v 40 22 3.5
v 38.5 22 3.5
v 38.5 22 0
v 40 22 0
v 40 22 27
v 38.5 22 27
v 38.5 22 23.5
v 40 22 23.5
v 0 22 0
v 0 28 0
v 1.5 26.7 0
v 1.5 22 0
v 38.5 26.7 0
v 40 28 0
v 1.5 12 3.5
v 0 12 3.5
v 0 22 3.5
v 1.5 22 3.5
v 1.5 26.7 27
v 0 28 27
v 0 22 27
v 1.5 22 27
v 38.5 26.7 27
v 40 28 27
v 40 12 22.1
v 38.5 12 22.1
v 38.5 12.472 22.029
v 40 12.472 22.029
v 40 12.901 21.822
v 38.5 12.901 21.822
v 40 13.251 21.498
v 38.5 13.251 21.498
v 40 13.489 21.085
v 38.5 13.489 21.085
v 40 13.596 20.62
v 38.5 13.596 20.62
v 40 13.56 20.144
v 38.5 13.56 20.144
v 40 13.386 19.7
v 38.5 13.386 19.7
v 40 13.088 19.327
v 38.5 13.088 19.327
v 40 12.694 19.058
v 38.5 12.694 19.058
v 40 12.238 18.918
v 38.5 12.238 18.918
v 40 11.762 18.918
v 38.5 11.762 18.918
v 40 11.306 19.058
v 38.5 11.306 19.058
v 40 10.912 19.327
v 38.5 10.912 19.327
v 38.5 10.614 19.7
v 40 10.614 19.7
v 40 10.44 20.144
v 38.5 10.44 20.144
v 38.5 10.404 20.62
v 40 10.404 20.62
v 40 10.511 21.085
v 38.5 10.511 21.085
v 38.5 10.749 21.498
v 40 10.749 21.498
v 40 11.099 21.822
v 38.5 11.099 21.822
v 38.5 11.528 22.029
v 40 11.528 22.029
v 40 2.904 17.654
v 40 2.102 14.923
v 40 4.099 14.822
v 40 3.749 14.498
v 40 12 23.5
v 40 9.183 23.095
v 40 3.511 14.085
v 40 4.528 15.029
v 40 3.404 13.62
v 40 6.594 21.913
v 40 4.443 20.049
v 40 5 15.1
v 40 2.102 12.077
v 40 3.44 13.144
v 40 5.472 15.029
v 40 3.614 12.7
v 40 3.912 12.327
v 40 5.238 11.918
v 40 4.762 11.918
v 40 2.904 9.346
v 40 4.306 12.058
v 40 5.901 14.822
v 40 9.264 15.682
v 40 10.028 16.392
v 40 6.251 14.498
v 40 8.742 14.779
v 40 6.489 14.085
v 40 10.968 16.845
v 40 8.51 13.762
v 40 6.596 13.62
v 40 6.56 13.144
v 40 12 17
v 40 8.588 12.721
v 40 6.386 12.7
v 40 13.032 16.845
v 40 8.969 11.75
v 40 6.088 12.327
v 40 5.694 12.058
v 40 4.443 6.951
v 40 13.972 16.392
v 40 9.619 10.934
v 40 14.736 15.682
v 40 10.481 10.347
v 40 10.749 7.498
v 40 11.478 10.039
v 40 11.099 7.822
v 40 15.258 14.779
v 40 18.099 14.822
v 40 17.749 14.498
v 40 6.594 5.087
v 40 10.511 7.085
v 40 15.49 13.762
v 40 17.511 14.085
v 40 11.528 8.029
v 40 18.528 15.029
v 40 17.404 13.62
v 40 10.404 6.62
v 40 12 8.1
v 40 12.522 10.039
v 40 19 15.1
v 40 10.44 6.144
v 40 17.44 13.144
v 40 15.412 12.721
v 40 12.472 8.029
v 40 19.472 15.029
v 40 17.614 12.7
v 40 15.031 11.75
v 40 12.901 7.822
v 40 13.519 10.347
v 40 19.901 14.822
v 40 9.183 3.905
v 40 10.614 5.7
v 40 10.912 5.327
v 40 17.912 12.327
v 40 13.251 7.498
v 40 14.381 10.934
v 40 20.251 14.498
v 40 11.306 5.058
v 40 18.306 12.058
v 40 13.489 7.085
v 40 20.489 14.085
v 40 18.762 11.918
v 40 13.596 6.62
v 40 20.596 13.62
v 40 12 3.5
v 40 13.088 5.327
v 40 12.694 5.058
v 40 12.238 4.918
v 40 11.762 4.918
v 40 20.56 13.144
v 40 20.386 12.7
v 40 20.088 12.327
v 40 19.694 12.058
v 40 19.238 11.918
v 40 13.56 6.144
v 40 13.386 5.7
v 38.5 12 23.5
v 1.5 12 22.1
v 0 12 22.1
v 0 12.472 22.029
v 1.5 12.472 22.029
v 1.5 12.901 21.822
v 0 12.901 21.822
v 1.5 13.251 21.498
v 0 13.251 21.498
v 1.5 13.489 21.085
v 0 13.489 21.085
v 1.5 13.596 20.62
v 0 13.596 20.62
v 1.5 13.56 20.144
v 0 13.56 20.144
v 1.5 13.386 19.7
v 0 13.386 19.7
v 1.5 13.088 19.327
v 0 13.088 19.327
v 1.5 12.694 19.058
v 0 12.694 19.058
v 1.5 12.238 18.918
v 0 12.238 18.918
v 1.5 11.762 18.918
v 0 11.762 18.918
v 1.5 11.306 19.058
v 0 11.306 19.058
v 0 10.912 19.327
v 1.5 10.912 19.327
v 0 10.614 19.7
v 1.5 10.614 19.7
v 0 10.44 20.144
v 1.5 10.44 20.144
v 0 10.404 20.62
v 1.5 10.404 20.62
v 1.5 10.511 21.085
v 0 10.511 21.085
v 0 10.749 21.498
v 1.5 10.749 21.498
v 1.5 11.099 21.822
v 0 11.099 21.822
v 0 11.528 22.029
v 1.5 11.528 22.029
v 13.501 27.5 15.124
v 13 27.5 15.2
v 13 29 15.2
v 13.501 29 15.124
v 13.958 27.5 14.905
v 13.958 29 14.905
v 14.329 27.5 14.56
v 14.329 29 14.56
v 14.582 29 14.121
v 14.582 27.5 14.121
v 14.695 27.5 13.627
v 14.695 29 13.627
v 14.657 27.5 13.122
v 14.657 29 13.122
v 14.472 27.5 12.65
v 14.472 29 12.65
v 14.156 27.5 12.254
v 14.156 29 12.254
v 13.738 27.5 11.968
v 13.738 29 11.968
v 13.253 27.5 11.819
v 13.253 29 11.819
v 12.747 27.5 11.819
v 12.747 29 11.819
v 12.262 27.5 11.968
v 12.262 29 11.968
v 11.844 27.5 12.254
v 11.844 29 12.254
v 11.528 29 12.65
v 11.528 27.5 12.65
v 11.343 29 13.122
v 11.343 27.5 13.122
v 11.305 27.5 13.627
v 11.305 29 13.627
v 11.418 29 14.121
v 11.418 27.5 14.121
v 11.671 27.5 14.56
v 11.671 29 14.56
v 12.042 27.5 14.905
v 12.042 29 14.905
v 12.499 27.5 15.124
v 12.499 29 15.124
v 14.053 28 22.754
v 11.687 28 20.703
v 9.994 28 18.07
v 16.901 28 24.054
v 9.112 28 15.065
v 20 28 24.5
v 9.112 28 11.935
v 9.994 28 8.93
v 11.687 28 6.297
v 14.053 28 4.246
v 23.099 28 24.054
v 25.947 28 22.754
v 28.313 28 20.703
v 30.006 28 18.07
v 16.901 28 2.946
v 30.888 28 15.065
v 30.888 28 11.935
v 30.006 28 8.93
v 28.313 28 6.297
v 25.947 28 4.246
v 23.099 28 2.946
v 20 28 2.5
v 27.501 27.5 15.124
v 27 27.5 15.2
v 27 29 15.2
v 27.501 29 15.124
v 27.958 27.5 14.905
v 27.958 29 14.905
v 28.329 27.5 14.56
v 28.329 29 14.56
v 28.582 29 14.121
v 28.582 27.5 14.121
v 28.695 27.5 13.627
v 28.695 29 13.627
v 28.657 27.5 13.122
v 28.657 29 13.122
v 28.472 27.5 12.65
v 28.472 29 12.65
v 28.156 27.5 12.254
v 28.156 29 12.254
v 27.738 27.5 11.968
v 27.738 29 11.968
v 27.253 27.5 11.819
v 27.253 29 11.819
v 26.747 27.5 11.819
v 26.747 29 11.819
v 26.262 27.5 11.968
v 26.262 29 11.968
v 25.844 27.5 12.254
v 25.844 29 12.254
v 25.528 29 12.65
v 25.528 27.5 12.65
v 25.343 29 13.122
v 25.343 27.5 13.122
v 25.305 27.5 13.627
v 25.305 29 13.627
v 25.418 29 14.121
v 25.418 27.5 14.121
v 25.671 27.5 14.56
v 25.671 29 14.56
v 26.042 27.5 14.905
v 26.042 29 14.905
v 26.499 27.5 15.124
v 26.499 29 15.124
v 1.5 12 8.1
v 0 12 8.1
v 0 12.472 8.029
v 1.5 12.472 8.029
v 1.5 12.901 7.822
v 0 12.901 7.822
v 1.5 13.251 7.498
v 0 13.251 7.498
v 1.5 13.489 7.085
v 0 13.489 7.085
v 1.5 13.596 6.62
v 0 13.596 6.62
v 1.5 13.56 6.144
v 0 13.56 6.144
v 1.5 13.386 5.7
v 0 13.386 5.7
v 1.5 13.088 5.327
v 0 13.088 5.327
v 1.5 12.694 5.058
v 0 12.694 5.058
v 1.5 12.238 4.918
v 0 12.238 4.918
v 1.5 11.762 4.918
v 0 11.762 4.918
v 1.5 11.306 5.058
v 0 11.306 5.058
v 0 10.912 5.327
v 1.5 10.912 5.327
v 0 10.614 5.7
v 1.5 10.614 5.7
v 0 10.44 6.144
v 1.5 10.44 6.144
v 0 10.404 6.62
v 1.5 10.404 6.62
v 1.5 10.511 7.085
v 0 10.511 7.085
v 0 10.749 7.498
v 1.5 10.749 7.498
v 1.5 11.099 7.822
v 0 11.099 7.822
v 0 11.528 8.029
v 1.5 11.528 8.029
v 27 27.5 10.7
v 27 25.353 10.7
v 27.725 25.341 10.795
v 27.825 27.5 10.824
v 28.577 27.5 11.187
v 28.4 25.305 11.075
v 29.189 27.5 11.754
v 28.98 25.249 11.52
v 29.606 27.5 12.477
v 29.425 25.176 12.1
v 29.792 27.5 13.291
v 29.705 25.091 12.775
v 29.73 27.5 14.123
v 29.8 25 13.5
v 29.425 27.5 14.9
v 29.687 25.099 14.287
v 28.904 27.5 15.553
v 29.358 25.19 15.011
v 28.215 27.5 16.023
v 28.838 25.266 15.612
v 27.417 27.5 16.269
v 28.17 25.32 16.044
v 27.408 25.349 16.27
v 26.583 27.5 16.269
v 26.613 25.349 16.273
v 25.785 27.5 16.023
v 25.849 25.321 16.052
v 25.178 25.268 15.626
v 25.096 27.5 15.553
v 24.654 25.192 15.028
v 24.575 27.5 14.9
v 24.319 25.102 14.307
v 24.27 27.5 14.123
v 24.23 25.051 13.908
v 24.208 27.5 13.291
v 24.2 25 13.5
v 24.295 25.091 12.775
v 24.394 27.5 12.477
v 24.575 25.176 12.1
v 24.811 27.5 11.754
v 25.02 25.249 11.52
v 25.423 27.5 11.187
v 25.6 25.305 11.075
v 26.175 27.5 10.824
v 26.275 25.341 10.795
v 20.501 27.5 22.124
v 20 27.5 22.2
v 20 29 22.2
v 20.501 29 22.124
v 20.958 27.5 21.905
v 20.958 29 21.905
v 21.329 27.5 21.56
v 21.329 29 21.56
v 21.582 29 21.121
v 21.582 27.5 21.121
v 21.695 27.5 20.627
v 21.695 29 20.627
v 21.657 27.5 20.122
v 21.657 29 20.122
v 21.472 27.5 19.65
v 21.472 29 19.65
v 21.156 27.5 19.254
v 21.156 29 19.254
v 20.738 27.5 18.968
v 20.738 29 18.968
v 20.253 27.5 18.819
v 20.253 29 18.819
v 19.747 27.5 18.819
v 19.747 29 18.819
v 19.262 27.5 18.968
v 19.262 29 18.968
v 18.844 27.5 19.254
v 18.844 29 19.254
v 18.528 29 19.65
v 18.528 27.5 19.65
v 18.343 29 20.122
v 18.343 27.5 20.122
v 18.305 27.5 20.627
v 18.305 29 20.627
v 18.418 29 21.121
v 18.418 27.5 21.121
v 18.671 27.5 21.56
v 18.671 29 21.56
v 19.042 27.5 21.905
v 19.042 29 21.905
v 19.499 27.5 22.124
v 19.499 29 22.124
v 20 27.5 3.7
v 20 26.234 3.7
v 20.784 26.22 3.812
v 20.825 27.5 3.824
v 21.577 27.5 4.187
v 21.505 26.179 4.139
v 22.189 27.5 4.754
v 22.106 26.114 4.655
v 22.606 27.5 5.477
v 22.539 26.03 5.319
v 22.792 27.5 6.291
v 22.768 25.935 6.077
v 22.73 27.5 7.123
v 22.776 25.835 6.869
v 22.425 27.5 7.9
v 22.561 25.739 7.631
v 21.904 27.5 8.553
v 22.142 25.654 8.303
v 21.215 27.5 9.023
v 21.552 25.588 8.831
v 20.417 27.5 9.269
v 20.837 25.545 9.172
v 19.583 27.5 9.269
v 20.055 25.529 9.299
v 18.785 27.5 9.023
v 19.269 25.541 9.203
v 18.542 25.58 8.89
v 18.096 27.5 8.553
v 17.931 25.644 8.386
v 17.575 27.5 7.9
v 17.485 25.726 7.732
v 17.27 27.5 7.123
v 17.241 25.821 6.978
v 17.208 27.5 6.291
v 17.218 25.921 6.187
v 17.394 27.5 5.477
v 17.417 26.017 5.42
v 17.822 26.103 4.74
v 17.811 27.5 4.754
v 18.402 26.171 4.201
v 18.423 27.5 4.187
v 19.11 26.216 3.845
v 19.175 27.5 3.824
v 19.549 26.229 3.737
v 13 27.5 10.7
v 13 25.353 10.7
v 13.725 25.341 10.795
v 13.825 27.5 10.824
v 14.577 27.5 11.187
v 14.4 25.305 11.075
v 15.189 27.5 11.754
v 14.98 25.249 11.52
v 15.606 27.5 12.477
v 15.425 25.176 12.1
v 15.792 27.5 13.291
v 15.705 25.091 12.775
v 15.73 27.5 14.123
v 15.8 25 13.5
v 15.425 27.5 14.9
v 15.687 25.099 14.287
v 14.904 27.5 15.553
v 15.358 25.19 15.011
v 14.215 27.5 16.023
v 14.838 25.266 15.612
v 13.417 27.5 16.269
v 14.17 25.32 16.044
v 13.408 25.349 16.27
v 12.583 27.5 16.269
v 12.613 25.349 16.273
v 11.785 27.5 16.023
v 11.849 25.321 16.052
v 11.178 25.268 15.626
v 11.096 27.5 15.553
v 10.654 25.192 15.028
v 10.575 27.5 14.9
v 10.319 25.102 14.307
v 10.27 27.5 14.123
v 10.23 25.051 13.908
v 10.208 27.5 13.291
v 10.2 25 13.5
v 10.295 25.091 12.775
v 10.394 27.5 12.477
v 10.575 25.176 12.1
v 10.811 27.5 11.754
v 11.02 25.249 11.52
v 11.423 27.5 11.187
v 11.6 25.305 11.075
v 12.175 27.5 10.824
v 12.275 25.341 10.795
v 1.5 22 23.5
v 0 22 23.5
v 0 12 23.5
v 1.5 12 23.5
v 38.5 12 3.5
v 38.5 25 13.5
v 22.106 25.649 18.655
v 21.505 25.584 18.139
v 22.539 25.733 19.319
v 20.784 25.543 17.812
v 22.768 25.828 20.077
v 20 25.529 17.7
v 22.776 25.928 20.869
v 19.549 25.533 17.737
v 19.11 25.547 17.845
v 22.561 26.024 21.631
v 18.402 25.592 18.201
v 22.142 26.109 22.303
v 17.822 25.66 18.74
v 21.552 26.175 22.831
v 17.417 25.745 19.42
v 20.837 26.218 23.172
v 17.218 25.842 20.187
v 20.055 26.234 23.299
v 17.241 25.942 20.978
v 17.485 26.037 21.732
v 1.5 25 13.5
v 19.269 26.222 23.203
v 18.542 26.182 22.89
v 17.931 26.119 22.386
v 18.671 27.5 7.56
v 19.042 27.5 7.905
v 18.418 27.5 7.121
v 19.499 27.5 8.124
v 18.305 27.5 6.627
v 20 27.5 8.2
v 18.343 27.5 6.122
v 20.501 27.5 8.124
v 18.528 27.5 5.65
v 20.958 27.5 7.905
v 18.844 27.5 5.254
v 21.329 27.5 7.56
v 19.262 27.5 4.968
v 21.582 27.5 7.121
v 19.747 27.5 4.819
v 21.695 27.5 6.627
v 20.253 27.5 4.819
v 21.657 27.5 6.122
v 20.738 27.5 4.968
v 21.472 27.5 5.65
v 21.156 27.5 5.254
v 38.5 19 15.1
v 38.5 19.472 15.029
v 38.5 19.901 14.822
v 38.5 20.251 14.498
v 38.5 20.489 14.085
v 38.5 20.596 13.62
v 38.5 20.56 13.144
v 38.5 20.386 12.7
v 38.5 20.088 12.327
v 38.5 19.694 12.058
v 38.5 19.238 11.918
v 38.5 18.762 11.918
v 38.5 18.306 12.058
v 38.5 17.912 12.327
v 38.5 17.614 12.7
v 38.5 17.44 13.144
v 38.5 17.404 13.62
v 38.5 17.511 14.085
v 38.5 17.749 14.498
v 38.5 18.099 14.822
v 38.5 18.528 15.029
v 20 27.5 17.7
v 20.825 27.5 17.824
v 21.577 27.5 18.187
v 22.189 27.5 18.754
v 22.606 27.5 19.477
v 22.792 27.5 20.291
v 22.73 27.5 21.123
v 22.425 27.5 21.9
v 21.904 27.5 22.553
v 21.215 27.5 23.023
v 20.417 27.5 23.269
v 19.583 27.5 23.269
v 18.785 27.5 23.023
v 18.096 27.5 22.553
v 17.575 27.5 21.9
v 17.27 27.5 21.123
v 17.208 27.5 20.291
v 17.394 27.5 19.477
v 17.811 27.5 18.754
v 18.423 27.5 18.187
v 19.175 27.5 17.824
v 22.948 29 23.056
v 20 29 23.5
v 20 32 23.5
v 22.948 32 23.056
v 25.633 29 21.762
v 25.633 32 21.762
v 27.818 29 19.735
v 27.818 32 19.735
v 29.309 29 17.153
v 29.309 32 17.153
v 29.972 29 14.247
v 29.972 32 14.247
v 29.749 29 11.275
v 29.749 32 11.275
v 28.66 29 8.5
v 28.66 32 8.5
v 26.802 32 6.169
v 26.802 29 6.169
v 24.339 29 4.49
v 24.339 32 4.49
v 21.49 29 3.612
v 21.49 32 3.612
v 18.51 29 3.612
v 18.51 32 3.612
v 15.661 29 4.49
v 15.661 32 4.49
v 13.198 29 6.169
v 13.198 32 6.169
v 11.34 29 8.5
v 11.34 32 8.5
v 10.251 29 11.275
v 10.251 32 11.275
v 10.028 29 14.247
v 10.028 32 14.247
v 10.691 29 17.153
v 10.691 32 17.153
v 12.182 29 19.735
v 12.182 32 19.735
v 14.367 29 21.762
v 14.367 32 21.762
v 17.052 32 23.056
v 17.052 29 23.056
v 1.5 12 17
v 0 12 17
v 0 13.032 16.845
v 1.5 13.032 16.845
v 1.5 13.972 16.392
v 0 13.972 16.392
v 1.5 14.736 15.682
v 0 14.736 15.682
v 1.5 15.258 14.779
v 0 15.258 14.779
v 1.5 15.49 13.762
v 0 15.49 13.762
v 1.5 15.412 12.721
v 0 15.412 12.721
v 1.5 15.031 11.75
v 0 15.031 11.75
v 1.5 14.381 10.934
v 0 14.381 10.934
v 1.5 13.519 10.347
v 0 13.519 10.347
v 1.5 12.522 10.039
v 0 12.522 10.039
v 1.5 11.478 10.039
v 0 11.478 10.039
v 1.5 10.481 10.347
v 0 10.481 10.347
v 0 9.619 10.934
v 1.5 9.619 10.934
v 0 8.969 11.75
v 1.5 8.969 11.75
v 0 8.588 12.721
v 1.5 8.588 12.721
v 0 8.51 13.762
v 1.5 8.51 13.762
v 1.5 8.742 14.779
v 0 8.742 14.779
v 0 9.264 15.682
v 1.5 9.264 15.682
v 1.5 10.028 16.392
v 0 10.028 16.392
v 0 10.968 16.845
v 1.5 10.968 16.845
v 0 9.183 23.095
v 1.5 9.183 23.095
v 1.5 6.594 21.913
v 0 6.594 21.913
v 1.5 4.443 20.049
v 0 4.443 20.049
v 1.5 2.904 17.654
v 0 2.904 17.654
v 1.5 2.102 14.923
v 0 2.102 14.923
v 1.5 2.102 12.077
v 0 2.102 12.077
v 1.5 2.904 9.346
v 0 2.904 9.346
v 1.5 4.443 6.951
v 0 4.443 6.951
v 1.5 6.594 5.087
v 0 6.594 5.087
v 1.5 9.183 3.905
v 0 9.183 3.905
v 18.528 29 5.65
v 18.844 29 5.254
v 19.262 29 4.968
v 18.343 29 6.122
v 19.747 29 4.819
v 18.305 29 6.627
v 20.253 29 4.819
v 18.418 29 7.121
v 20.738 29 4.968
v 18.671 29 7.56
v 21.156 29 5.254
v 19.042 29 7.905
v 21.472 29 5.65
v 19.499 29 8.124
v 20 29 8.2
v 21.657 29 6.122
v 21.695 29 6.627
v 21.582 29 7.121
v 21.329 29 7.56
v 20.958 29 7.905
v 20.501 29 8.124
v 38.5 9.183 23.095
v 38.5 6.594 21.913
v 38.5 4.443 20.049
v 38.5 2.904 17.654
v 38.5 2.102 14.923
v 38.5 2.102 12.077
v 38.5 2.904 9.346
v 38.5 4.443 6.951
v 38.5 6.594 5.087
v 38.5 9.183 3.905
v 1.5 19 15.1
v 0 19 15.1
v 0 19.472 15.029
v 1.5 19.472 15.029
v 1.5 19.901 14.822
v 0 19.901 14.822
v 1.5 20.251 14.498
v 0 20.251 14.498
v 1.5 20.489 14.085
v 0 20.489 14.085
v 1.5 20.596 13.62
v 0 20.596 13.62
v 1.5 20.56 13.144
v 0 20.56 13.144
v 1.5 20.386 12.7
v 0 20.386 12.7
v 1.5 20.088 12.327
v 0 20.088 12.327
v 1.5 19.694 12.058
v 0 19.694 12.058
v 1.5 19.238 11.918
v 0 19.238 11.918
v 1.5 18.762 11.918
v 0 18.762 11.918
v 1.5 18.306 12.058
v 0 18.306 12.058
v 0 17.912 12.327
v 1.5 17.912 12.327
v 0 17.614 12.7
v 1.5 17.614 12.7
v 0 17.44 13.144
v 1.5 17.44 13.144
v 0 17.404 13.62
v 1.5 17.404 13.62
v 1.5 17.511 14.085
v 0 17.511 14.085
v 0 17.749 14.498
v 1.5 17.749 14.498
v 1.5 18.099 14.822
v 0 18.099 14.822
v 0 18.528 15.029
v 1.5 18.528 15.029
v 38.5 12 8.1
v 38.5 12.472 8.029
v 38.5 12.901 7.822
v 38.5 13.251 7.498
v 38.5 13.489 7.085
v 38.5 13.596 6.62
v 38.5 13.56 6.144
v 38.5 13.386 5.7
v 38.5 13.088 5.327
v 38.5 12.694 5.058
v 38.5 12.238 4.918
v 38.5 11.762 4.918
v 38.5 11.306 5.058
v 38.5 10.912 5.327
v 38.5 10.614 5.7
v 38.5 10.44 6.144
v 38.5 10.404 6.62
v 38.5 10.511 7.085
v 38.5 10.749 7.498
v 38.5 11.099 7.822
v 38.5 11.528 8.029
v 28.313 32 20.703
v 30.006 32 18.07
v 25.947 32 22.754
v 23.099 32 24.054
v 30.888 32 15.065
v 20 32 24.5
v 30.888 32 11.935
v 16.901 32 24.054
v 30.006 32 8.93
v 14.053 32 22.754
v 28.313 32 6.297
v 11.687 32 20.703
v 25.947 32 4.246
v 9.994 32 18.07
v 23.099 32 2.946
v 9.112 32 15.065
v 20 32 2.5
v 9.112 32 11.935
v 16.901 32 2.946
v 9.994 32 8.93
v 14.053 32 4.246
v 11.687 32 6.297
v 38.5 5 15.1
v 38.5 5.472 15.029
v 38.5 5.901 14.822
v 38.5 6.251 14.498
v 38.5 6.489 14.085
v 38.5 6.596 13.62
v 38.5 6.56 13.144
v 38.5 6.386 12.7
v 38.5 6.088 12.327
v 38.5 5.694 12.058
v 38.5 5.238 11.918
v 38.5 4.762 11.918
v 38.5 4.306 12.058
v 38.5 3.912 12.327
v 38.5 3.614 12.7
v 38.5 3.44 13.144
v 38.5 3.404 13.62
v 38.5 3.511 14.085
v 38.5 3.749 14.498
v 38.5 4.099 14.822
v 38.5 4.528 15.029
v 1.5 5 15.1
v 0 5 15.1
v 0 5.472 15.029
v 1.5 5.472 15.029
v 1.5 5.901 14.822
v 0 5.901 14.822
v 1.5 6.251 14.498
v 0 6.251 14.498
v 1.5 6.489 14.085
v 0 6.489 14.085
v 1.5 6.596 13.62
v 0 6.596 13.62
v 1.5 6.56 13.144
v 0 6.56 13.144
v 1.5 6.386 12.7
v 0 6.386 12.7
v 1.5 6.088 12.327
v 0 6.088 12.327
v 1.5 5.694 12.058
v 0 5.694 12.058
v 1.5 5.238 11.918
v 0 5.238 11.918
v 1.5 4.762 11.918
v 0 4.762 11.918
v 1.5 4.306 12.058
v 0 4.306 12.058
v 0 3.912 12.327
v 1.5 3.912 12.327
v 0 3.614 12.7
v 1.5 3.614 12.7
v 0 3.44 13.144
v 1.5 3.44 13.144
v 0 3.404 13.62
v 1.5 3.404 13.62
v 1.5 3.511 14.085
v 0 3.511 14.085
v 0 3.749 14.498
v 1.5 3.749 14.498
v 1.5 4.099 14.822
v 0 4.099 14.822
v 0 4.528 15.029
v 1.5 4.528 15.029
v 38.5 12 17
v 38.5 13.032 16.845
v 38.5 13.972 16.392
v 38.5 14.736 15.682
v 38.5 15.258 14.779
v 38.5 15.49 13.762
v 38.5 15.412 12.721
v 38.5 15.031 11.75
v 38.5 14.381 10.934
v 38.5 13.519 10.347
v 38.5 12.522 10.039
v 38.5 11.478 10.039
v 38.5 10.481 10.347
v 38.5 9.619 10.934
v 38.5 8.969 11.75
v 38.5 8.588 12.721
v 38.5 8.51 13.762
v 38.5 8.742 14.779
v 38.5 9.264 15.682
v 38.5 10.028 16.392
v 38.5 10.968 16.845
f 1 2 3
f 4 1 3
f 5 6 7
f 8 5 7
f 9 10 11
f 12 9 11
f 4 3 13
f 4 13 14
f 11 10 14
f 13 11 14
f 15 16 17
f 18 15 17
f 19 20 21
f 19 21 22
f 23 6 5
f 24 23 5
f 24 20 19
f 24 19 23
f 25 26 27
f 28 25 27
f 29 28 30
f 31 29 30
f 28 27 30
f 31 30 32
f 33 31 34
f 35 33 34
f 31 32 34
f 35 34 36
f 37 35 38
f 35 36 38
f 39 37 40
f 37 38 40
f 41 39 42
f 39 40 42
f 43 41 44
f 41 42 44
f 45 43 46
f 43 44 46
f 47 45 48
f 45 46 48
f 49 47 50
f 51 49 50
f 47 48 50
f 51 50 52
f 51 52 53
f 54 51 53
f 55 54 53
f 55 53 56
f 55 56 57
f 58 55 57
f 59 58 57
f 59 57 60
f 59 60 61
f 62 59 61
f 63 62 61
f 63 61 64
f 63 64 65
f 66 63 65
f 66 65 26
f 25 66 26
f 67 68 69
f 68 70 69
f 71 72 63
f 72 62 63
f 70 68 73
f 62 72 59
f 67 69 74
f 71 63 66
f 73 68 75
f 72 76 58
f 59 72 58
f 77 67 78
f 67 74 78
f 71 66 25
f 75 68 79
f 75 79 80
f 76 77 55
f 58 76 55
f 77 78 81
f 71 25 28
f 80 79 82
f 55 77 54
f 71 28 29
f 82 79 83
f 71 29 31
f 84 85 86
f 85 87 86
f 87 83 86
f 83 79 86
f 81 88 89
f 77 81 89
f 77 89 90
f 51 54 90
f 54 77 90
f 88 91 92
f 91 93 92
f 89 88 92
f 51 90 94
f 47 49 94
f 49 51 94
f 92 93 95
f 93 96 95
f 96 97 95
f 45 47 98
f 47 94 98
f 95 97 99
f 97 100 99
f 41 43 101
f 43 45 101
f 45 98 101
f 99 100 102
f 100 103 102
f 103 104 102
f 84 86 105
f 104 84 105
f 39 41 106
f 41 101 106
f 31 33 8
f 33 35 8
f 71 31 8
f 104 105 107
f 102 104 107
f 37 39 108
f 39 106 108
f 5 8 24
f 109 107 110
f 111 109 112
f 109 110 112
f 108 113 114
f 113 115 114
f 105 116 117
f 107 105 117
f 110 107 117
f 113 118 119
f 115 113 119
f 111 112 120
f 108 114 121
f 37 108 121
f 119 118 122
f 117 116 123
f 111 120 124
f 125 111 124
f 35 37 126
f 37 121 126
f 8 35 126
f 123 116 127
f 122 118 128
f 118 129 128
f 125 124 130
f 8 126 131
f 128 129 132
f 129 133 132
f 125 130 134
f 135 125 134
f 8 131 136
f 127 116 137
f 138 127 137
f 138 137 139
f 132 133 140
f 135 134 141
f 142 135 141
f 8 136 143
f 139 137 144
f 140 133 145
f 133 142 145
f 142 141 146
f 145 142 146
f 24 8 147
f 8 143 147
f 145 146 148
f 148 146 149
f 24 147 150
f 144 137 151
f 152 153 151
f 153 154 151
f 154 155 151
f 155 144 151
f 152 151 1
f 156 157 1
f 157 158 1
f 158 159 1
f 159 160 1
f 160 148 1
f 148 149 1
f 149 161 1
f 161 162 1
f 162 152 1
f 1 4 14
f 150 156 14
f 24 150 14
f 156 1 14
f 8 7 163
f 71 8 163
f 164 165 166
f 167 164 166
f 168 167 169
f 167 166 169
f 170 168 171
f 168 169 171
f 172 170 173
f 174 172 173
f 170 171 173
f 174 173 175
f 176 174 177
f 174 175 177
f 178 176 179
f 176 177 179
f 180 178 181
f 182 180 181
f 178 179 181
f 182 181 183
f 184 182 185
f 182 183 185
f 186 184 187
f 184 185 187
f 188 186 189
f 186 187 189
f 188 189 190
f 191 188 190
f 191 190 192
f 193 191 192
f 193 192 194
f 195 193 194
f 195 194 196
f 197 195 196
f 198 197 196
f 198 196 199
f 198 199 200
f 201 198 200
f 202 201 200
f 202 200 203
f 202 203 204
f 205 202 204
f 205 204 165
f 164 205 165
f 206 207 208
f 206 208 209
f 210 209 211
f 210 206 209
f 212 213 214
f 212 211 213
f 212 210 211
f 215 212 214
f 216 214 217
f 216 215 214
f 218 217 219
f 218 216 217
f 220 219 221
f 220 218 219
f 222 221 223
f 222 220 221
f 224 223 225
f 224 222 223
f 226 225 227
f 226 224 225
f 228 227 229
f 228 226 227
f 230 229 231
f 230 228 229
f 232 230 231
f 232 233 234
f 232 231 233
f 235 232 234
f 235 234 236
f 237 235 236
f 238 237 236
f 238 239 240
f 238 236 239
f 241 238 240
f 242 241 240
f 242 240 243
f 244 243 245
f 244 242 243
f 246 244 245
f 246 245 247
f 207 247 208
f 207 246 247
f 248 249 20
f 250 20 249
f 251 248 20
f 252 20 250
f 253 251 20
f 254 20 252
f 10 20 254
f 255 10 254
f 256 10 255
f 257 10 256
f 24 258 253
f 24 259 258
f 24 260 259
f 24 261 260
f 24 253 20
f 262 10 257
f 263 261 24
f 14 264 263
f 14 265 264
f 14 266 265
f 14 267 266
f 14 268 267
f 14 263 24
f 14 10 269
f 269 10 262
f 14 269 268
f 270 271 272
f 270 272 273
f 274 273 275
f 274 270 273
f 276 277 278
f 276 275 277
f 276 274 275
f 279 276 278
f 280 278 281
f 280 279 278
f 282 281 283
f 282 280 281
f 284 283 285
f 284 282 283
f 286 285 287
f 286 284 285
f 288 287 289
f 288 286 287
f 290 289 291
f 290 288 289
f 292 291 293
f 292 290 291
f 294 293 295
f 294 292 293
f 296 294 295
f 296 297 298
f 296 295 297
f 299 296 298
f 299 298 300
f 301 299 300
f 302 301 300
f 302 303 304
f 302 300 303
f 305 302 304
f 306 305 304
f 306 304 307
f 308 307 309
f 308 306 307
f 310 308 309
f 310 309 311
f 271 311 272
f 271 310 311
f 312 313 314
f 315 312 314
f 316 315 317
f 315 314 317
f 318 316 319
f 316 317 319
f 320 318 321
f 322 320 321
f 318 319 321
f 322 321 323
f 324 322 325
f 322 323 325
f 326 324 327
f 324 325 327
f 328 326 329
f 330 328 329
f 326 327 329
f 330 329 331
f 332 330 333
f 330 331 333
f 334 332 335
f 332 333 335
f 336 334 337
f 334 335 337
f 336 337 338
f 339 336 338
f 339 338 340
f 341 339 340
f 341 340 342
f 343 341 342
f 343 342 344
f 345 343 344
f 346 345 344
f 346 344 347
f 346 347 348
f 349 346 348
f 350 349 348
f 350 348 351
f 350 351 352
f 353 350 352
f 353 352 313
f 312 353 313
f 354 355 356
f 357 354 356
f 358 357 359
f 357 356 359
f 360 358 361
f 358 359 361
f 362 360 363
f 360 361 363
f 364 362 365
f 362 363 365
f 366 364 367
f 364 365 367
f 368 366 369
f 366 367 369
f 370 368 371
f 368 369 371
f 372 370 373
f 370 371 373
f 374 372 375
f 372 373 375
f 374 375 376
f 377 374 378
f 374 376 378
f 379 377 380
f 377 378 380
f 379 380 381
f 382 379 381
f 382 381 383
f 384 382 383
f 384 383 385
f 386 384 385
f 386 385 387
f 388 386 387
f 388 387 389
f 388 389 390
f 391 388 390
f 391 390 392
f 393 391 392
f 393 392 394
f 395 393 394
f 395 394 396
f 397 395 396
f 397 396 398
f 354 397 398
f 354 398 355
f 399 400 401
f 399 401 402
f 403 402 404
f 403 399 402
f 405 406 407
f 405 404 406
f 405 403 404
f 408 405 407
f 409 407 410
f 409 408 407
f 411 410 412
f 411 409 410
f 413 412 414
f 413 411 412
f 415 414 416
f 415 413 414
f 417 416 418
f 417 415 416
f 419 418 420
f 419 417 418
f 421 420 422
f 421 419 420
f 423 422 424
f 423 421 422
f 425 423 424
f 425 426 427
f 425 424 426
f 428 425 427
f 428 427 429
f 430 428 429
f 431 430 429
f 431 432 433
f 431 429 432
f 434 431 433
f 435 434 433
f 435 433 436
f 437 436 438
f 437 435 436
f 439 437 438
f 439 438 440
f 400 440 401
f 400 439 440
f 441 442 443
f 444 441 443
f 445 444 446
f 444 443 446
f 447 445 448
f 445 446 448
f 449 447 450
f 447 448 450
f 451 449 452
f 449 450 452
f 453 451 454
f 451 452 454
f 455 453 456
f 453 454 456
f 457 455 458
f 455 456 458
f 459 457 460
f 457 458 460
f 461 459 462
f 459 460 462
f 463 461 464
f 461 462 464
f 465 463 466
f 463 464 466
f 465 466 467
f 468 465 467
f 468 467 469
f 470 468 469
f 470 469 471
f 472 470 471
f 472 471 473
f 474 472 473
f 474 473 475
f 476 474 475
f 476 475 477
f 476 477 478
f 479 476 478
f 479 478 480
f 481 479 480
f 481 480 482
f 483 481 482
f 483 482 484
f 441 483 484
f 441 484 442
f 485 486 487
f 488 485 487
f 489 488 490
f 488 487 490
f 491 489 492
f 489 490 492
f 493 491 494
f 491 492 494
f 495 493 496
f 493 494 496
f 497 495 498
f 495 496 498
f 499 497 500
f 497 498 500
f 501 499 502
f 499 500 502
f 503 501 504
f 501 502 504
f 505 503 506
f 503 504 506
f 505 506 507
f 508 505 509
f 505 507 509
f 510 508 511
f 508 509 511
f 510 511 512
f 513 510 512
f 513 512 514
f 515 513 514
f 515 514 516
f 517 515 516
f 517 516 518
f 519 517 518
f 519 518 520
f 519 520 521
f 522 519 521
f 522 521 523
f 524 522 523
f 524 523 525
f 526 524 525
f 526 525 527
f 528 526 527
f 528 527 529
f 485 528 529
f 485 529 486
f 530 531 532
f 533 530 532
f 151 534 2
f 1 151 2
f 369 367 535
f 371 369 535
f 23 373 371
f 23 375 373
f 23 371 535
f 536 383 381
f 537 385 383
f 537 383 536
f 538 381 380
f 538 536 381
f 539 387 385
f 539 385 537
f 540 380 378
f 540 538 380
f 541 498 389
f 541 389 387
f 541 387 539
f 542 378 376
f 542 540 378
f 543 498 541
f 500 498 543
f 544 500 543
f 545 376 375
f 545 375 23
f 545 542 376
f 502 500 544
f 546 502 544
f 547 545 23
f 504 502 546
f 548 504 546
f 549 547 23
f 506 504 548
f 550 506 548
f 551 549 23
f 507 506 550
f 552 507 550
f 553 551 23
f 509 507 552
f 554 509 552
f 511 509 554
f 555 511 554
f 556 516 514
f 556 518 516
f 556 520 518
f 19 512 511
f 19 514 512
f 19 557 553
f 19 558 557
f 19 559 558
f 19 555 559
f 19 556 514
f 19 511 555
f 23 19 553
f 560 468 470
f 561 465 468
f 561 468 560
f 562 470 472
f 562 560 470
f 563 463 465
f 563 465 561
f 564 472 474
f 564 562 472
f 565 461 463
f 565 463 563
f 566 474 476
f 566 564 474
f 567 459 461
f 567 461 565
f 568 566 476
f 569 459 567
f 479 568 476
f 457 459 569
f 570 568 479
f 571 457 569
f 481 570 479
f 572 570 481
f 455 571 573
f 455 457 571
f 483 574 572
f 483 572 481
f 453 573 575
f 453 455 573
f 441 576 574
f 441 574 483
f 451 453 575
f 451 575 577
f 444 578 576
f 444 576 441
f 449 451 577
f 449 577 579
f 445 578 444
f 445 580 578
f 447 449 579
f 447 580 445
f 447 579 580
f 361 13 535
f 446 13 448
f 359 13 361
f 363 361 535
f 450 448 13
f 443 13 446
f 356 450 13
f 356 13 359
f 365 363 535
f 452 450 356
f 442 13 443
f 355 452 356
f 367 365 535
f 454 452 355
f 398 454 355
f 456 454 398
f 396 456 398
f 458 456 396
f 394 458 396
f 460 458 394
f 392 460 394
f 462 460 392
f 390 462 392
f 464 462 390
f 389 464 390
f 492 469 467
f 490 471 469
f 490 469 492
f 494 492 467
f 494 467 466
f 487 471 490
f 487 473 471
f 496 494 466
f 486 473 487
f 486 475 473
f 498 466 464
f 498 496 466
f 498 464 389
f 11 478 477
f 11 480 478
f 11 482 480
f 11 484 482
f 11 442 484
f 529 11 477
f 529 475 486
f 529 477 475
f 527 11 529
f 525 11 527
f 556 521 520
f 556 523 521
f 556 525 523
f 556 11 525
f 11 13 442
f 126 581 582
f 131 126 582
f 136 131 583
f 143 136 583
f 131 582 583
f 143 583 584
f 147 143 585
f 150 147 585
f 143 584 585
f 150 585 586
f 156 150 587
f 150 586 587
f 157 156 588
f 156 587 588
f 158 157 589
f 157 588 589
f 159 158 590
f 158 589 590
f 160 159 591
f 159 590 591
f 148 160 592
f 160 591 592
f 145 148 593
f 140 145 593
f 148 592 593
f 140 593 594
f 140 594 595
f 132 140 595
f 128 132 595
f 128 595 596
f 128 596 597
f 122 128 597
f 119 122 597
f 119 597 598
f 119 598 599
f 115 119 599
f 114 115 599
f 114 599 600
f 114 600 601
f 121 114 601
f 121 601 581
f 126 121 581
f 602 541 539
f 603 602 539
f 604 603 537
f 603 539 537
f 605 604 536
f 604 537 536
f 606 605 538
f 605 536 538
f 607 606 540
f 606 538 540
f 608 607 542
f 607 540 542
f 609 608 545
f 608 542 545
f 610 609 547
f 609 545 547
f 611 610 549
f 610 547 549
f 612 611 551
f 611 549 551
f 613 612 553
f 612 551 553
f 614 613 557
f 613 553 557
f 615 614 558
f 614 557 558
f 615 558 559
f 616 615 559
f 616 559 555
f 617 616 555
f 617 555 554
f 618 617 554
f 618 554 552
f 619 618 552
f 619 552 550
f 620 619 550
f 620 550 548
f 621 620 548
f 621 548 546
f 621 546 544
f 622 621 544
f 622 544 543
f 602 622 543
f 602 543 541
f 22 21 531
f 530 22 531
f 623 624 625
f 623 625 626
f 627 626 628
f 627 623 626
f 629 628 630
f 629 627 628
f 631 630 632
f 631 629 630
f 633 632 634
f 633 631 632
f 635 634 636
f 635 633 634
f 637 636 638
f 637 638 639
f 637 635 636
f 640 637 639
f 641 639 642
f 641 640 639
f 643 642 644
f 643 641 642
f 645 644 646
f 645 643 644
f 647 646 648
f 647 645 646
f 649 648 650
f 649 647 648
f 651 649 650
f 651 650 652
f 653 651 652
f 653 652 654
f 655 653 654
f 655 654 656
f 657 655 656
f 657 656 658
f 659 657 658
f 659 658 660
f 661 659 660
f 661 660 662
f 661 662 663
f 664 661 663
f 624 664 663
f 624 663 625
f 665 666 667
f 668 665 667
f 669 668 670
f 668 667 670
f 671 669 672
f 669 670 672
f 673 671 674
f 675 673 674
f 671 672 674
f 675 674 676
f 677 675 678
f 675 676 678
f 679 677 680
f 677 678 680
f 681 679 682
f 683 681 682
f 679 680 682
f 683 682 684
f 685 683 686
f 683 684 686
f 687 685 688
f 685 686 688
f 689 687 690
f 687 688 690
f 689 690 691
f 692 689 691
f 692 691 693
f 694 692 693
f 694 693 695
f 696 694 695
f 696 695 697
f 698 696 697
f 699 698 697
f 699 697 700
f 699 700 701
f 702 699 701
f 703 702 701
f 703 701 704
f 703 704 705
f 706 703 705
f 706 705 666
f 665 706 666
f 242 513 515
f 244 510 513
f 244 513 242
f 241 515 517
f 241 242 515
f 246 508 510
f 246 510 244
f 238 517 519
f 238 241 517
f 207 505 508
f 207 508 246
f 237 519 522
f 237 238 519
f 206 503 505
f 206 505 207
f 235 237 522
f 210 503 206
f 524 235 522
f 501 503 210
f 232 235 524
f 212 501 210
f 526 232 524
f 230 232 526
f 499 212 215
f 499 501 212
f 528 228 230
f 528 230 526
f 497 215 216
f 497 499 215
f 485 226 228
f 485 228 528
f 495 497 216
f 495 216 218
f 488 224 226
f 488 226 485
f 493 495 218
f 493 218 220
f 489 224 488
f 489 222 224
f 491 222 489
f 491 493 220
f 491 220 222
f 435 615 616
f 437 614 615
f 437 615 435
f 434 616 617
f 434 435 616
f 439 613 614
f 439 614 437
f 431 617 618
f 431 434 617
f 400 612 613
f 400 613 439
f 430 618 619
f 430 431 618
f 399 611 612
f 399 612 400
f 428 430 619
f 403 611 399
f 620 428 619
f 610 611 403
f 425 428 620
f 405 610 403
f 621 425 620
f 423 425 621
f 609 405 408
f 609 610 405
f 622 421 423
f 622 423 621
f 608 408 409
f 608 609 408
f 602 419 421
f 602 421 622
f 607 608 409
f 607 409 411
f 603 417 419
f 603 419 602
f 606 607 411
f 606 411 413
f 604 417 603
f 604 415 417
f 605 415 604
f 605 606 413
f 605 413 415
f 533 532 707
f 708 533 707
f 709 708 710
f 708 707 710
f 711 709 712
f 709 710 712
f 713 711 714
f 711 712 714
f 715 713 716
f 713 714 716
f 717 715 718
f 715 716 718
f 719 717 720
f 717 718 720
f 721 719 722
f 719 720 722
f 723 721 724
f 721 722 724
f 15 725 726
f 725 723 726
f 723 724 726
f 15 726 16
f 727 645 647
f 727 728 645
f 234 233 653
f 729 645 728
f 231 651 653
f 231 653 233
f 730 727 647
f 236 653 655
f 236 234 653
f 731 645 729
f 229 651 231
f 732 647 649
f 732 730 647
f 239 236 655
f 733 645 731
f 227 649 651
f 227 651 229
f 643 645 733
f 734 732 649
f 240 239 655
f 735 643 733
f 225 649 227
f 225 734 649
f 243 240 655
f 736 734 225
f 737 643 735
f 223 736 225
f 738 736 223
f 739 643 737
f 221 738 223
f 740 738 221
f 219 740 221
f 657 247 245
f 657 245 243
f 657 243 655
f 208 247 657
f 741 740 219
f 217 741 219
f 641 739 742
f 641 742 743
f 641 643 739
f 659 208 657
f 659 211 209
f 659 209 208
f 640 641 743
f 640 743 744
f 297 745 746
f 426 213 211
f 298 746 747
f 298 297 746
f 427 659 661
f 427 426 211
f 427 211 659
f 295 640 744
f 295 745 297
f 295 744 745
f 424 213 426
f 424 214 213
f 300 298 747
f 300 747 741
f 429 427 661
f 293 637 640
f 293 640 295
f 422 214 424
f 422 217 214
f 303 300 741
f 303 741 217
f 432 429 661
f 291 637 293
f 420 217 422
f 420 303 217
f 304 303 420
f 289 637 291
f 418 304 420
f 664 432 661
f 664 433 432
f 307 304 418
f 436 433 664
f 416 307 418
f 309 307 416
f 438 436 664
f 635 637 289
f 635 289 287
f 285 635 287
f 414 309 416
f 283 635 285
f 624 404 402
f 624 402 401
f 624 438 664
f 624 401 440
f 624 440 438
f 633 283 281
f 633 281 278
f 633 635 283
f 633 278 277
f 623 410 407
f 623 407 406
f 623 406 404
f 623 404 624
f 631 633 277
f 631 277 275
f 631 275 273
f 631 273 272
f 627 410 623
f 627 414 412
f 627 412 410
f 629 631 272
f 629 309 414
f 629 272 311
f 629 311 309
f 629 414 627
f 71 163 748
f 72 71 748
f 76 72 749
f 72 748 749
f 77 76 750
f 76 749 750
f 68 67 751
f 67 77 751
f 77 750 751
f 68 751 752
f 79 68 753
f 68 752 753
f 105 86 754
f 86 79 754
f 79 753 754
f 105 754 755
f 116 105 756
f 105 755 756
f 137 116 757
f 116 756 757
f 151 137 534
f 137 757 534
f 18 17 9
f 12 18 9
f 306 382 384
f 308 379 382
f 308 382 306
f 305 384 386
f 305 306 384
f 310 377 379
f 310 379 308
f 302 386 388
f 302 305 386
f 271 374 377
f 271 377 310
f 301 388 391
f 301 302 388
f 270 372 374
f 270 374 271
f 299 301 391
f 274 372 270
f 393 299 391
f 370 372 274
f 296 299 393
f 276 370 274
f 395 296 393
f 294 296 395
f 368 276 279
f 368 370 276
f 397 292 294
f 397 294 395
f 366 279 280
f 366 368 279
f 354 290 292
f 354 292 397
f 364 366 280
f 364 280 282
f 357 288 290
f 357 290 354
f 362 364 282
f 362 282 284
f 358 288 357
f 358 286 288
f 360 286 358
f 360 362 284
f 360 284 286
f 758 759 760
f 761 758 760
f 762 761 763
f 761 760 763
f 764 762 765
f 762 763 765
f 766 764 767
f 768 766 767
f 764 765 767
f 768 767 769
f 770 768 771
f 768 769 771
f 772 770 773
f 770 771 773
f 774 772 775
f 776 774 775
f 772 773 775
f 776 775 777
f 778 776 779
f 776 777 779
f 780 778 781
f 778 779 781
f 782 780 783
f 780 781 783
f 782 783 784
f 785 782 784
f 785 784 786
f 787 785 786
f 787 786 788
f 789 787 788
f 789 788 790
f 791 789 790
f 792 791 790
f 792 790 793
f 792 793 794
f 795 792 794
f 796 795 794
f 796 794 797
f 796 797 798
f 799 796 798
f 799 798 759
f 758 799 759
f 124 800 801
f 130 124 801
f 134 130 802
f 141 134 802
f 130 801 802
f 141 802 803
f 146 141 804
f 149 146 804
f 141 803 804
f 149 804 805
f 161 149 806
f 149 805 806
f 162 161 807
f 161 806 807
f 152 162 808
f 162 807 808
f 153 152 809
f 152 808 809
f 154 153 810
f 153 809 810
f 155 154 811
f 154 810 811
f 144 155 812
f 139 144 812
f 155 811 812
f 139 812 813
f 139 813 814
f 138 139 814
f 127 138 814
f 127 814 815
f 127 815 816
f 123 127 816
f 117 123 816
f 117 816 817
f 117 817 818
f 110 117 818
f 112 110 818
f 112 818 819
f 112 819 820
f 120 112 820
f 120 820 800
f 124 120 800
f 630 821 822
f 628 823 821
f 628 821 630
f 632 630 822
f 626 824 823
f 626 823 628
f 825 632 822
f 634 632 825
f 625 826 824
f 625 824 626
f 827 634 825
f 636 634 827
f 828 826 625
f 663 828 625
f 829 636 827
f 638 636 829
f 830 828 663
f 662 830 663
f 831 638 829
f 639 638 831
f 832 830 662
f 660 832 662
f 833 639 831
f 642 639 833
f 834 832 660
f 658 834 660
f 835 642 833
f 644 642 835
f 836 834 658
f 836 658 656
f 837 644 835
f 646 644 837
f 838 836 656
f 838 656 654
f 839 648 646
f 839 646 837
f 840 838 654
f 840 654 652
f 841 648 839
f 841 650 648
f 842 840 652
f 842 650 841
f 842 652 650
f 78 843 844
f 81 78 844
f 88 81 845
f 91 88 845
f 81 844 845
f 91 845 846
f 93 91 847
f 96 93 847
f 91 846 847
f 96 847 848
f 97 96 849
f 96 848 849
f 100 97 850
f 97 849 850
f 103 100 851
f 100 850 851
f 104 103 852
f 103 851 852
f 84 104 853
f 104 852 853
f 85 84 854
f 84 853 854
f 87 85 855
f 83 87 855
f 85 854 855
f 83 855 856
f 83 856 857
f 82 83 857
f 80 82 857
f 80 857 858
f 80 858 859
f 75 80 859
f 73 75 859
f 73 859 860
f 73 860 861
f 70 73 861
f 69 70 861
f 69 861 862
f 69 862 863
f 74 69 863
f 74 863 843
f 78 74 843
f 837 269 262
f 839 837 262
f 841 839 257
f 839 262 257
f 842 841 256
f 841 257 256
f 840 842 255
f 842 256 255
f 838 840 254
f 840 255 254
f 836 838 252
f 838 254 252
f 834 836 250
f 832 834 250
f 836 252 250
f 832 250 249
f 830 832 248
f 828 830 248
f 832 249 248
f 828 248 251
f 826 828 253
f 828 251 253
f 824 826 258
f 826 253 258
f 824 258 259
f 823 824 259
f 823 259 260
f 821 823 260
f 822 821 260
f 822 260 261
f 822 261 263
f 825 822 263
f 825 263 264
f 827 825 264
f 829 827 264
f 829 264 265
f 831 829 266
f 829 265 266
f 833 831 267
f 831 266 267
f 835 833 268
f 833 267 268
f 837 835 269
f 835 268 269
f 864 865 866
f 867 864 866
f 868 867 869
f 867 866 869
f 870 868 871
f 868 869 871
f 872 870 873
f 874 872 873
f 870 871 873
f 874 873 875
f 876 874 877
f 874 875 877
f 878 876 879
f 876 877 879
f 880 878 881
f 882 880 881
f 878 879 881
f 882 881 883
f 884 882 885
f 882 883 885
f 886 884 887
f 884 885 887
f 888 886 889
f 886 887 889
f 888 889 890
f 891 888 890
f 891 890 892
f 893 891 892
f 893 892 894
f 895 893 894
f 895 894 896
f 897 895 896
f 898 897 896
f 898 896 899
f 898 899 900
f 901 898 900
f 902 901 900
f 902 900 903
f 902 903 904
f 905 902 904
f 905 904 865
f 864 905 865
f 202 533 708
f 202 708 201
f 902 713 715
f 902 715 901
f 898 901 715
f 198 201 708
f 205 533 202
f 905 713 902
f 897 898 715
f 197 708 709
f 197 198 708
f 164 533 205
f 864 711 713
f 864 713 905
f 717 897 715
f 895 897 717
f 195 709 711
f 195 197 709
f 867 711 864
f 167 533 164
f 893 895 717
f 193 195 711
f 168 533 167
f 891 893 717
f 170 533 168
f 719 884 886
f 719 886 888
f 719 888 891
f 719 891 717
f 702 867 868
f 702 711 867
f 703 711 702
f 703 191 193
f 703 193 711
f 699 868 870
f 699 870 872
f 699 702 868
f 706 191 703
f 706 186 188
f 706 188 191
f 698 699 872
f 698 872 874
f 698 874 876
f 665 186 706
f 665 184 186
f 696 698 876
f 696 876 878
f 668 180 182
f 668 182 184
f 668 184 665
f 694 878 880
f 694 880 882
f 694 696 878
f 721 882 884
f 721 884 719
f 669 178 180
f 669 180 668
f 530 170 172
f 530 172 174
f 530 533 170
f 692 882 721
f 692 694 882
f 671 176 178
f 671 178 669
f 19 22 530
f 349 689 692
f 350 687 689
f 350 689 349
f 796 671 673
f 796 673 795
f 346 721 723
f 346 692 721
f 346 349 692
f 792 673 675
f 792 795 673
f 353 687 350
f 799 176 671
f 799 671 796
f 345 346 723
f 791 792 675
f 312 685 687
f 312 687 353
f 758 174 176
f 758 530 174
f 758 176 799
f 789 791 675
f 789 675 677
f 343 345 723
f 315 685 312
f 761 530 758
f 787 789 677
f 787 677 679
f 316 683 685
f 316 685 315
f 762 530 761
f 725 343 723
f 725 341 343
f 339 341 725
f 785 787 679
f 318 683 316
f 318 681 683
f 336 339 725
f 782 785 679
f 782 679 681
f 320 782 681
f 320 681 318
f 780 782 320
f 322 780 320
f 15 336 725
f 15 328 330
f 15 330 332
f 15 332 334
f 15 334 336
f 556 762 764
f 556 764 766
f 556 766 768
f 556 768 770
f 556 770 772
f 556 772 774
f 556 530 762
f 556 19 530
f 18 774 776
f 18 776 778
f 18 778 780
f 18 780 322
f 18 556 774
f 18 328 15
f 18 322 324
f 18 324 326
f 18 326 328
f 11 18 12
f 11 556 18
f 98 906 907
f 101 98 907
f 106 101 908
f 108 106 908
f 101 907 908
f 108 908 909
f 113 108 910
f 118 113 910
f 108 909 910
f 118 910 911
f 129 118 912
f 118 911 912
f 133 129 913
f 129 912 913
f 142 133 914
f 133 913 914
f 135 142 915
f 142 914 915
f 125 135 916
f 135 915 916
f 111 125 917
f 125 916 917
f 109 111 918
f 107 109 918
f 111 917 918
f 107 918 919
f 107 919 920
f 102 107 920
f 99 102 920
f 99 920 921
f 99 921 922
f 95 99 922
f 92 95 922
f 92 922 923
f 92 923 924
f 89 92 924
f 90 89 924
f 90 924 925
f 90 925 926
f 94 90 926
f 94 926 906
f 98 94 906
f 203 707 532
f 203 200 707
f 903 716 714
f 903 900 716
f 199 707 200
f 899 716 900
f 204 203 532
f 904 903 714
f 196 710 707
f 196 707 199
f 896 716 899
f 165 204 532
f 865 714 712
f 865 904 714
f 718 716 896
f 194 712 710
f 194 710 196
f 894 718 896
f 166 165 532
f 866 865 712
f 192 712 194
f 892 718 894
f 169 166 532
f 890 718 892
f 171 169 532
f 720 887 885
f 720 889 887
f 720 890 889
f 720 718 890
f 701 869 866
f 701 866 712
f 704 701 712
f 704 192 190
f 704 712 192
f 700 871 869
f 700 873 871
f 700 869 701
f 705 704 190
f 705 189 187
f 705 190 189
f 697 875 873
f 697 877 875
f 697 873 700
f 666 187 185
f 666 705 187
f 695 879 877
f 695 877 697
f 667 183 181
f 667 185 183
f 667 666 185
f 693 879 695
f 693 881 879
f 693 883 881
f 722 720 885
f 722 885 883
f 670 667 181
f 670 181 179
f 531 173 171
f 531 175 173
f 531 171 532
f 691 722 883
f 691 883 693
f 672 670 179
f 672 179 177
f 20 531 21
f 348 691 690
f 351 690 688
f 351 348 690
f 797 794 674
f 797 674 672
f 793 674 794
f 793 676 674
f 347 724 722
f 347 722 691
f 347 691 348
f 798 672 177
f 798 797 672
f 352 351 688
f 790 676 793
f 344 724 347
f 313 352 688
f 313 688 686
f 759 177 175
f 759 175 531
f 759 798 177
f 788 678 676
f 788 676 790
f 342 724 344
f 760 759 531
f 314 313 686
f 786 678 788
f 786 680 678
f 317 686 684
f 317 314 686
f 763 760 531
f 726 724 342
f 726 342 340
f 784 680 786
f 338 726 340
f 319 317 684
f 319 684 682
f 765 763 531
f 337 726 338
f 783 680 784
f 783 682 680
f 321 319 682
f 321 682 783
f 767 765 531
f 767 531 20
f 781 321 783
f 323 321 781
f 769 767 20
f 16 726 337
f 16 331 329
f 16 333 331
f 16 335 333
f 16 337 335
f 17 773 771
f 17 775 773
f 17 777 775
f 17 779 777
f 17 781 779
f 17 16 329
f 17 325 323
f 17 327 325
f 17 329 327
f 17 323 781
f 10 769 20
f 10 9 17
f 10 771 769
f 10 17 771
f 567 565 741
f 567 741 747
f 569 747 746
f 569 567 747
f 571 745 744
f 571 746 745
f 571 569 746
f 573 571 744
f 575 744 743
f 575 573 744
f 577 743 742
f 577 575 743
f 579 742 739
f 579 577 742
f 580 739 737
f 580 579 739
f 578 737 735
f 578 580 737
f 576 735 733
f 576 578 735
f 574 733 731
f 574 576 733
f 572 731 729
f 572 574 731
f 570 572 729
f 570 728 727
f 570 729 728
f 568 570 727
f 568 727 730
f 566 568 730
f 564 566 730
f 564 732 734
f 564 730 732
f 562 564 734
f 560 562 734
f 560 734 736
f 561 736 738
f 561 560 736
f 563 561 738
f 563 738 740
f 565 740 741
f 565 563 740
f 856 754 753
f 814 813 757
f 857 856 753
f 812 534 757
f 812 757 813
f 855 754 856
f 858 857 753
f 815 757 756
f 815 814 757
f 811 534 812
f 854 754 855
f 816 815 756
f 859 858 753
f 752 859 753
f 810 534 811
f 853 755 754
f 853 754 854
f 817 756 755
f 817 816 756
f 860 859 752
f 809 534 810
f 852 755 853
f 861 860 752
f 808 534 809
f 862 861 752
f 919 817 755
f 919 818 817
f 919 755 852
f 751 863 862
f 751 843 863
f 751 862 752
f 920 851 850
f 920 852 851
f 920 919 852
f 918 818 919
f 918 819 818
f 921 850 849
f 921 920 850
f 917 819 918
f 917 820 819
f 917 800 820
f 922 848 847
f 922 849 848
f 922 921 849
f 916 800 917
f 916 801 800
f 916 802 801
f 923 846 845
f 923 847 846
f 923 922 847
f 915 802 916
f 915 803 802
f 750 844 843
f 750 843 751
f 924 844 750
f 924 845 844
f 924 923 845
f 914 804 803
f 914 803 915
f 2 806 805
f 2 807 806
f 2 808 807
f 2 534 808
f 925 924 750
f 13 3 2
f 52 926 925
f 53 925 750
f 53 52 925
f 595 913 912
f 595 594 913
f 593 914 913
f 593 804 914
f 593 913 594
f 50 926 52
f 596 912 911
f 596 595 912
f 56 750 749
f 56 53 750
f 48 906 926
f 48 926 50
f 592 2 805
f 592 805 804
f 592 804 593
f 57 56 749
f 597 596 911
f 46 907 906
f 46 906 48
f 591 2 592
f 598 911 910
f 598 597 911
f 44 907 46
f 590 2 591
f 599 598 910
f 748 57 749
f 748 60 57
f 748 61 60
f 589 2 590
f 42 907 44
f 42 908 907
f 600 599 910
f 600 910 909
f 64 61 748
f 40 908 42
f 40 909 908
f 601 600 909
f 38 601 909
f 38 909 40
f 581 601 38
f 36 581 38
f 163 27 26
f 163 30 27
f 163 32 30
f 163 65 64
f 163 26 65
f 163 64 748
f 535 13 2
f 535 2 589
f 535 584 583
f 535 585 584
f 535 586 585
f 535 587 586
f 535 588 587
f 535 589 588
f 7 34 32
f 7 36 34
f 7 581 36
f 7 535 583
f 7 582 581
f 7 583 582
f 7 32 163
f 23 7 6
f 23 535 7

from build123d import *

# Parameters (mm, degrees)
SKETCH_1_W               = 40
SKETCH_1_H               = 28
EXTRUDE_1_DEPTH          = 27
SKETCH_2_W               = 37
SKETCH_2_H               = 27
CUT_EXTRUDE_1_DEPTH      = 25
SKETCH_3_R               = 1.6
SKETCH_3_R_2             = 3.5
CUT_EXTRUDE_2_DEPTH      = 56.794264938
SKETCH_4_R               = 11
SKETCH_4_R_2             = 10
EXTRUDE_2_DEPTH          = 4
SKETCH_11_R              = 10
EXTRUDE_3_DEPTH          = 1
CUT_EXTRUDE_3_DEPTH      = 56.794264938
CUT_EXTRUDE_3_DEPTH_BACK = 56.794264938
SKETCH_6_R               = 1.7
SKETCH_7_R               = 2.8
CUT_EXTRUDE_4_DEPTH      = 2.5
CUT_EXTRUDE_6_REACH      = 58.879
CUT_EXTRUDE_5_DEPTH      = 58.905094767


with BuildPart() as part:
    # 草图1 → 凸台-拉伸1 (new body)
    with BuildSketch(Plane.XY):
        with Locations((20, 14)):
            Rectangle(SKETCH_1_W, SKETCH_1_H)
    extrude(amount=EXTRUDE_1_DEPTH)

    # 草图2 → 切除-拉伸1 (cut)
    with BuildSketch(Plane.XZ):
        with Locations((20, 13.5)):
            Rectangle(SKETCH_2_W, SKETCH_2_H)
    extrude(amount=-CUT_EXTRUDE_1_DEPTH, mode=Mode.SUBTRACT)

    # 草图3 → 切除-拉伸2 (cut, through all)
    with BuildSketch(Plane.ZY):
        with Locations((13.5, 5)):
            Circle(SKETCH_3_R)
        with Locations((13.5, 12)):
            Circle(SKETCH_3_R_2)
        with Locations((6.5, 12)):
            Circle(SKETCH_3_R)
        with Locations((20.5, 12)):
            Circle(SKETCH_3_R)
        with Locations((13.5, 19)):
            Circle(SKETCH_3_R)
    extrude(amount=-CUT_EXTRUDE_2_DEPTH, mode=Mode.SUBTRACT)

    # 草图4 → 凸台-拉伸2 (add)
    with BuildSketch(Plane(origin=(0, 28, 0), x_dir=(1, 0, 0), z_dir=(0, 1, 0))):
        with Locations(Location((20, -13.5, 0), (0, 0, 90))):
            Circle(SKETCH_4_R)
        with Locations(Location((20, -13.5, 0), (0, 0, 270))):
            Circle(SKETCH_4_R_2, mode=Mode.SUBTRACT)
    extrude(amount=EXTRUDE_2_DEPTH)

    # 草图11 → 凸台-拉伸3 (add)
    with BuildSketch(Plane(origin=(0, 28, 0), x_dir=(1, 0, 0), z_dir=(0, 1, 0))):
        with Locations(Location((20, -13.5, 0), (0, 0, 270))):
            Circle(SKETCH_11_R)
    extrude(amount=EXTRUDE_3_DEPTH)

    # 草图6 → 切除-拉伸3 (cut, two sides: drawn at the far end of the back side and taken through both)
    with BuildSketch(Plane(origin=(0, 28, 0), x_dir=(1, 0, 0), z_dir=(0, 1, 0)).offset(-CUT_EXTRUDE_3_DEPTH_BACK)):
        with Locations(Location((20, -6.5, 0), (0, 0, 270))):
            Circle(SKETCH_6_R)
        with Locations(Location((27, -13.5, 0), (0, 0, 270))):
            Circle(SKETCH_6_R)
        with Locations(Location((20, -20.5, 0), (0, 0, 270))):
            Circle(SKETCH_6_R)
        with Locations(Location((13, -13.5, 0), (0, 0, 270))):
            Circle(SKETCH_6_R)
    extrude(amount=CUT_EXTRUDE_3_DEPTH + CUT_EXTRUDE_3_DEPTH_BACK, mode=Mode.SUBTRACT)

    # 草图7 → 切除-拉伸4 (cut)
    with BuildSketch(Plane.XZ.offset(-25)):
        with Locations(Location((20, 20.5, 0), (0, 0, 270))):
            Circle(SKETCH_7_R)
        with Locations(Location((27, 13.5, 0), (0, 0, 270))):
            Circle(SKETCH_7_R)
        with Locations(Location((20, 6.5, 0), (0, 0, 270))):
            Circle(SKETCH_7_R)
        with Locations(Location((13, 13.5, 0), (0, 0, 270))):
            Circle(SKETCH_7_R)
    extrude(amount=-CUT_EXTRUDE_4_DEPTH, mode=Mode.SUBTRACT)

    # 切除-拉伸6: up to this face of the body (flat: up to its plane)
    cut_extrude_6_end = Plane(part.part.faces().sort_by_distance((38.5, 12.5, 0.36796739))[0])
    # 草图10 → 切除-拉伸6 (cut, up to the picked face)
    with BuildSketch(Plane(origin=(1.5, 0, 0), x_dir=(0, 0, -1), z_dir=(1, 0, 0)), mode=Mode.PRIVATE) as cut_extrude_6_sk1:
        Polygon((-13.5, 25), (0, 25), (0, 26.7), align=None)
    cut_extrude_6_tool1 = split(extrude(cut_extrude_6_sk1.sketch, amount=CUT_EXTRUDE_6_REACH, mode=Mode.PRIVATE), bisect_by=cut_extrude_6_end, keep=Keep.BOTH, mode=Mode.PRIVATE)
    # 草图10 → 切除-拉伸6 (cut, up to the picked face)
    with BuildSketch(Plane(origin=(1.5, 0, 0), x_dir=(0, 0, -1), z_dir=(1, 0, 0)), mode=Mode.PRIVATE) as cut_extrude_6_sk2:
        Polygon((-27, 25), (-13.5, 25), (-27, 26.7), align=None)
    cut_extrude_6_tool2 = split(extrude(cut_extrude_6_sk2.sketch, amount=CUT_EXTRUDE_6_REACH, mode=Mode.PRIVATE), bisect_by=cut_extrude_6_end, keep=Keep.BOTH, mode=Mode.PRIVATE)
    add(cut_extrude_6_tool1.solids().sort_by(Axis((1.5, 25.566667, 4.5), (1, 0, 0)))[0], mode=Mode.SUBTRACT)
    add(cut_extrude_6_tool2.solids().sort_by(Axis((1.5, 25.566667, 22.5), (1, 0, 0)))[0], mode=Mode.SUBTRACT)

    # 草图9 → 切除-拉伸5 (cut, through all)
    with BuildSketch(Plane.ZY):
        with BuildLine():
            Line((3.5, 22), (0, 22))
            Line((0, 22), (0, 0))
            Line((0, 0), (27, 0))
            Line((27, 0), (27, 22))
            Line((27, 22), (23.5, 22))
            Line((23.5, 22), (23.5, 12))
            ThreePointArc((23.5, 12), (13.5, 2), (3.5, 12))
            Line((3.5, 12), (3.5, 22))
        make_face()
    extrude(amount=-CUT_EXTRUDE_5_DEPTH, mode=Mode.SUBTRACT)


solid = part.part
